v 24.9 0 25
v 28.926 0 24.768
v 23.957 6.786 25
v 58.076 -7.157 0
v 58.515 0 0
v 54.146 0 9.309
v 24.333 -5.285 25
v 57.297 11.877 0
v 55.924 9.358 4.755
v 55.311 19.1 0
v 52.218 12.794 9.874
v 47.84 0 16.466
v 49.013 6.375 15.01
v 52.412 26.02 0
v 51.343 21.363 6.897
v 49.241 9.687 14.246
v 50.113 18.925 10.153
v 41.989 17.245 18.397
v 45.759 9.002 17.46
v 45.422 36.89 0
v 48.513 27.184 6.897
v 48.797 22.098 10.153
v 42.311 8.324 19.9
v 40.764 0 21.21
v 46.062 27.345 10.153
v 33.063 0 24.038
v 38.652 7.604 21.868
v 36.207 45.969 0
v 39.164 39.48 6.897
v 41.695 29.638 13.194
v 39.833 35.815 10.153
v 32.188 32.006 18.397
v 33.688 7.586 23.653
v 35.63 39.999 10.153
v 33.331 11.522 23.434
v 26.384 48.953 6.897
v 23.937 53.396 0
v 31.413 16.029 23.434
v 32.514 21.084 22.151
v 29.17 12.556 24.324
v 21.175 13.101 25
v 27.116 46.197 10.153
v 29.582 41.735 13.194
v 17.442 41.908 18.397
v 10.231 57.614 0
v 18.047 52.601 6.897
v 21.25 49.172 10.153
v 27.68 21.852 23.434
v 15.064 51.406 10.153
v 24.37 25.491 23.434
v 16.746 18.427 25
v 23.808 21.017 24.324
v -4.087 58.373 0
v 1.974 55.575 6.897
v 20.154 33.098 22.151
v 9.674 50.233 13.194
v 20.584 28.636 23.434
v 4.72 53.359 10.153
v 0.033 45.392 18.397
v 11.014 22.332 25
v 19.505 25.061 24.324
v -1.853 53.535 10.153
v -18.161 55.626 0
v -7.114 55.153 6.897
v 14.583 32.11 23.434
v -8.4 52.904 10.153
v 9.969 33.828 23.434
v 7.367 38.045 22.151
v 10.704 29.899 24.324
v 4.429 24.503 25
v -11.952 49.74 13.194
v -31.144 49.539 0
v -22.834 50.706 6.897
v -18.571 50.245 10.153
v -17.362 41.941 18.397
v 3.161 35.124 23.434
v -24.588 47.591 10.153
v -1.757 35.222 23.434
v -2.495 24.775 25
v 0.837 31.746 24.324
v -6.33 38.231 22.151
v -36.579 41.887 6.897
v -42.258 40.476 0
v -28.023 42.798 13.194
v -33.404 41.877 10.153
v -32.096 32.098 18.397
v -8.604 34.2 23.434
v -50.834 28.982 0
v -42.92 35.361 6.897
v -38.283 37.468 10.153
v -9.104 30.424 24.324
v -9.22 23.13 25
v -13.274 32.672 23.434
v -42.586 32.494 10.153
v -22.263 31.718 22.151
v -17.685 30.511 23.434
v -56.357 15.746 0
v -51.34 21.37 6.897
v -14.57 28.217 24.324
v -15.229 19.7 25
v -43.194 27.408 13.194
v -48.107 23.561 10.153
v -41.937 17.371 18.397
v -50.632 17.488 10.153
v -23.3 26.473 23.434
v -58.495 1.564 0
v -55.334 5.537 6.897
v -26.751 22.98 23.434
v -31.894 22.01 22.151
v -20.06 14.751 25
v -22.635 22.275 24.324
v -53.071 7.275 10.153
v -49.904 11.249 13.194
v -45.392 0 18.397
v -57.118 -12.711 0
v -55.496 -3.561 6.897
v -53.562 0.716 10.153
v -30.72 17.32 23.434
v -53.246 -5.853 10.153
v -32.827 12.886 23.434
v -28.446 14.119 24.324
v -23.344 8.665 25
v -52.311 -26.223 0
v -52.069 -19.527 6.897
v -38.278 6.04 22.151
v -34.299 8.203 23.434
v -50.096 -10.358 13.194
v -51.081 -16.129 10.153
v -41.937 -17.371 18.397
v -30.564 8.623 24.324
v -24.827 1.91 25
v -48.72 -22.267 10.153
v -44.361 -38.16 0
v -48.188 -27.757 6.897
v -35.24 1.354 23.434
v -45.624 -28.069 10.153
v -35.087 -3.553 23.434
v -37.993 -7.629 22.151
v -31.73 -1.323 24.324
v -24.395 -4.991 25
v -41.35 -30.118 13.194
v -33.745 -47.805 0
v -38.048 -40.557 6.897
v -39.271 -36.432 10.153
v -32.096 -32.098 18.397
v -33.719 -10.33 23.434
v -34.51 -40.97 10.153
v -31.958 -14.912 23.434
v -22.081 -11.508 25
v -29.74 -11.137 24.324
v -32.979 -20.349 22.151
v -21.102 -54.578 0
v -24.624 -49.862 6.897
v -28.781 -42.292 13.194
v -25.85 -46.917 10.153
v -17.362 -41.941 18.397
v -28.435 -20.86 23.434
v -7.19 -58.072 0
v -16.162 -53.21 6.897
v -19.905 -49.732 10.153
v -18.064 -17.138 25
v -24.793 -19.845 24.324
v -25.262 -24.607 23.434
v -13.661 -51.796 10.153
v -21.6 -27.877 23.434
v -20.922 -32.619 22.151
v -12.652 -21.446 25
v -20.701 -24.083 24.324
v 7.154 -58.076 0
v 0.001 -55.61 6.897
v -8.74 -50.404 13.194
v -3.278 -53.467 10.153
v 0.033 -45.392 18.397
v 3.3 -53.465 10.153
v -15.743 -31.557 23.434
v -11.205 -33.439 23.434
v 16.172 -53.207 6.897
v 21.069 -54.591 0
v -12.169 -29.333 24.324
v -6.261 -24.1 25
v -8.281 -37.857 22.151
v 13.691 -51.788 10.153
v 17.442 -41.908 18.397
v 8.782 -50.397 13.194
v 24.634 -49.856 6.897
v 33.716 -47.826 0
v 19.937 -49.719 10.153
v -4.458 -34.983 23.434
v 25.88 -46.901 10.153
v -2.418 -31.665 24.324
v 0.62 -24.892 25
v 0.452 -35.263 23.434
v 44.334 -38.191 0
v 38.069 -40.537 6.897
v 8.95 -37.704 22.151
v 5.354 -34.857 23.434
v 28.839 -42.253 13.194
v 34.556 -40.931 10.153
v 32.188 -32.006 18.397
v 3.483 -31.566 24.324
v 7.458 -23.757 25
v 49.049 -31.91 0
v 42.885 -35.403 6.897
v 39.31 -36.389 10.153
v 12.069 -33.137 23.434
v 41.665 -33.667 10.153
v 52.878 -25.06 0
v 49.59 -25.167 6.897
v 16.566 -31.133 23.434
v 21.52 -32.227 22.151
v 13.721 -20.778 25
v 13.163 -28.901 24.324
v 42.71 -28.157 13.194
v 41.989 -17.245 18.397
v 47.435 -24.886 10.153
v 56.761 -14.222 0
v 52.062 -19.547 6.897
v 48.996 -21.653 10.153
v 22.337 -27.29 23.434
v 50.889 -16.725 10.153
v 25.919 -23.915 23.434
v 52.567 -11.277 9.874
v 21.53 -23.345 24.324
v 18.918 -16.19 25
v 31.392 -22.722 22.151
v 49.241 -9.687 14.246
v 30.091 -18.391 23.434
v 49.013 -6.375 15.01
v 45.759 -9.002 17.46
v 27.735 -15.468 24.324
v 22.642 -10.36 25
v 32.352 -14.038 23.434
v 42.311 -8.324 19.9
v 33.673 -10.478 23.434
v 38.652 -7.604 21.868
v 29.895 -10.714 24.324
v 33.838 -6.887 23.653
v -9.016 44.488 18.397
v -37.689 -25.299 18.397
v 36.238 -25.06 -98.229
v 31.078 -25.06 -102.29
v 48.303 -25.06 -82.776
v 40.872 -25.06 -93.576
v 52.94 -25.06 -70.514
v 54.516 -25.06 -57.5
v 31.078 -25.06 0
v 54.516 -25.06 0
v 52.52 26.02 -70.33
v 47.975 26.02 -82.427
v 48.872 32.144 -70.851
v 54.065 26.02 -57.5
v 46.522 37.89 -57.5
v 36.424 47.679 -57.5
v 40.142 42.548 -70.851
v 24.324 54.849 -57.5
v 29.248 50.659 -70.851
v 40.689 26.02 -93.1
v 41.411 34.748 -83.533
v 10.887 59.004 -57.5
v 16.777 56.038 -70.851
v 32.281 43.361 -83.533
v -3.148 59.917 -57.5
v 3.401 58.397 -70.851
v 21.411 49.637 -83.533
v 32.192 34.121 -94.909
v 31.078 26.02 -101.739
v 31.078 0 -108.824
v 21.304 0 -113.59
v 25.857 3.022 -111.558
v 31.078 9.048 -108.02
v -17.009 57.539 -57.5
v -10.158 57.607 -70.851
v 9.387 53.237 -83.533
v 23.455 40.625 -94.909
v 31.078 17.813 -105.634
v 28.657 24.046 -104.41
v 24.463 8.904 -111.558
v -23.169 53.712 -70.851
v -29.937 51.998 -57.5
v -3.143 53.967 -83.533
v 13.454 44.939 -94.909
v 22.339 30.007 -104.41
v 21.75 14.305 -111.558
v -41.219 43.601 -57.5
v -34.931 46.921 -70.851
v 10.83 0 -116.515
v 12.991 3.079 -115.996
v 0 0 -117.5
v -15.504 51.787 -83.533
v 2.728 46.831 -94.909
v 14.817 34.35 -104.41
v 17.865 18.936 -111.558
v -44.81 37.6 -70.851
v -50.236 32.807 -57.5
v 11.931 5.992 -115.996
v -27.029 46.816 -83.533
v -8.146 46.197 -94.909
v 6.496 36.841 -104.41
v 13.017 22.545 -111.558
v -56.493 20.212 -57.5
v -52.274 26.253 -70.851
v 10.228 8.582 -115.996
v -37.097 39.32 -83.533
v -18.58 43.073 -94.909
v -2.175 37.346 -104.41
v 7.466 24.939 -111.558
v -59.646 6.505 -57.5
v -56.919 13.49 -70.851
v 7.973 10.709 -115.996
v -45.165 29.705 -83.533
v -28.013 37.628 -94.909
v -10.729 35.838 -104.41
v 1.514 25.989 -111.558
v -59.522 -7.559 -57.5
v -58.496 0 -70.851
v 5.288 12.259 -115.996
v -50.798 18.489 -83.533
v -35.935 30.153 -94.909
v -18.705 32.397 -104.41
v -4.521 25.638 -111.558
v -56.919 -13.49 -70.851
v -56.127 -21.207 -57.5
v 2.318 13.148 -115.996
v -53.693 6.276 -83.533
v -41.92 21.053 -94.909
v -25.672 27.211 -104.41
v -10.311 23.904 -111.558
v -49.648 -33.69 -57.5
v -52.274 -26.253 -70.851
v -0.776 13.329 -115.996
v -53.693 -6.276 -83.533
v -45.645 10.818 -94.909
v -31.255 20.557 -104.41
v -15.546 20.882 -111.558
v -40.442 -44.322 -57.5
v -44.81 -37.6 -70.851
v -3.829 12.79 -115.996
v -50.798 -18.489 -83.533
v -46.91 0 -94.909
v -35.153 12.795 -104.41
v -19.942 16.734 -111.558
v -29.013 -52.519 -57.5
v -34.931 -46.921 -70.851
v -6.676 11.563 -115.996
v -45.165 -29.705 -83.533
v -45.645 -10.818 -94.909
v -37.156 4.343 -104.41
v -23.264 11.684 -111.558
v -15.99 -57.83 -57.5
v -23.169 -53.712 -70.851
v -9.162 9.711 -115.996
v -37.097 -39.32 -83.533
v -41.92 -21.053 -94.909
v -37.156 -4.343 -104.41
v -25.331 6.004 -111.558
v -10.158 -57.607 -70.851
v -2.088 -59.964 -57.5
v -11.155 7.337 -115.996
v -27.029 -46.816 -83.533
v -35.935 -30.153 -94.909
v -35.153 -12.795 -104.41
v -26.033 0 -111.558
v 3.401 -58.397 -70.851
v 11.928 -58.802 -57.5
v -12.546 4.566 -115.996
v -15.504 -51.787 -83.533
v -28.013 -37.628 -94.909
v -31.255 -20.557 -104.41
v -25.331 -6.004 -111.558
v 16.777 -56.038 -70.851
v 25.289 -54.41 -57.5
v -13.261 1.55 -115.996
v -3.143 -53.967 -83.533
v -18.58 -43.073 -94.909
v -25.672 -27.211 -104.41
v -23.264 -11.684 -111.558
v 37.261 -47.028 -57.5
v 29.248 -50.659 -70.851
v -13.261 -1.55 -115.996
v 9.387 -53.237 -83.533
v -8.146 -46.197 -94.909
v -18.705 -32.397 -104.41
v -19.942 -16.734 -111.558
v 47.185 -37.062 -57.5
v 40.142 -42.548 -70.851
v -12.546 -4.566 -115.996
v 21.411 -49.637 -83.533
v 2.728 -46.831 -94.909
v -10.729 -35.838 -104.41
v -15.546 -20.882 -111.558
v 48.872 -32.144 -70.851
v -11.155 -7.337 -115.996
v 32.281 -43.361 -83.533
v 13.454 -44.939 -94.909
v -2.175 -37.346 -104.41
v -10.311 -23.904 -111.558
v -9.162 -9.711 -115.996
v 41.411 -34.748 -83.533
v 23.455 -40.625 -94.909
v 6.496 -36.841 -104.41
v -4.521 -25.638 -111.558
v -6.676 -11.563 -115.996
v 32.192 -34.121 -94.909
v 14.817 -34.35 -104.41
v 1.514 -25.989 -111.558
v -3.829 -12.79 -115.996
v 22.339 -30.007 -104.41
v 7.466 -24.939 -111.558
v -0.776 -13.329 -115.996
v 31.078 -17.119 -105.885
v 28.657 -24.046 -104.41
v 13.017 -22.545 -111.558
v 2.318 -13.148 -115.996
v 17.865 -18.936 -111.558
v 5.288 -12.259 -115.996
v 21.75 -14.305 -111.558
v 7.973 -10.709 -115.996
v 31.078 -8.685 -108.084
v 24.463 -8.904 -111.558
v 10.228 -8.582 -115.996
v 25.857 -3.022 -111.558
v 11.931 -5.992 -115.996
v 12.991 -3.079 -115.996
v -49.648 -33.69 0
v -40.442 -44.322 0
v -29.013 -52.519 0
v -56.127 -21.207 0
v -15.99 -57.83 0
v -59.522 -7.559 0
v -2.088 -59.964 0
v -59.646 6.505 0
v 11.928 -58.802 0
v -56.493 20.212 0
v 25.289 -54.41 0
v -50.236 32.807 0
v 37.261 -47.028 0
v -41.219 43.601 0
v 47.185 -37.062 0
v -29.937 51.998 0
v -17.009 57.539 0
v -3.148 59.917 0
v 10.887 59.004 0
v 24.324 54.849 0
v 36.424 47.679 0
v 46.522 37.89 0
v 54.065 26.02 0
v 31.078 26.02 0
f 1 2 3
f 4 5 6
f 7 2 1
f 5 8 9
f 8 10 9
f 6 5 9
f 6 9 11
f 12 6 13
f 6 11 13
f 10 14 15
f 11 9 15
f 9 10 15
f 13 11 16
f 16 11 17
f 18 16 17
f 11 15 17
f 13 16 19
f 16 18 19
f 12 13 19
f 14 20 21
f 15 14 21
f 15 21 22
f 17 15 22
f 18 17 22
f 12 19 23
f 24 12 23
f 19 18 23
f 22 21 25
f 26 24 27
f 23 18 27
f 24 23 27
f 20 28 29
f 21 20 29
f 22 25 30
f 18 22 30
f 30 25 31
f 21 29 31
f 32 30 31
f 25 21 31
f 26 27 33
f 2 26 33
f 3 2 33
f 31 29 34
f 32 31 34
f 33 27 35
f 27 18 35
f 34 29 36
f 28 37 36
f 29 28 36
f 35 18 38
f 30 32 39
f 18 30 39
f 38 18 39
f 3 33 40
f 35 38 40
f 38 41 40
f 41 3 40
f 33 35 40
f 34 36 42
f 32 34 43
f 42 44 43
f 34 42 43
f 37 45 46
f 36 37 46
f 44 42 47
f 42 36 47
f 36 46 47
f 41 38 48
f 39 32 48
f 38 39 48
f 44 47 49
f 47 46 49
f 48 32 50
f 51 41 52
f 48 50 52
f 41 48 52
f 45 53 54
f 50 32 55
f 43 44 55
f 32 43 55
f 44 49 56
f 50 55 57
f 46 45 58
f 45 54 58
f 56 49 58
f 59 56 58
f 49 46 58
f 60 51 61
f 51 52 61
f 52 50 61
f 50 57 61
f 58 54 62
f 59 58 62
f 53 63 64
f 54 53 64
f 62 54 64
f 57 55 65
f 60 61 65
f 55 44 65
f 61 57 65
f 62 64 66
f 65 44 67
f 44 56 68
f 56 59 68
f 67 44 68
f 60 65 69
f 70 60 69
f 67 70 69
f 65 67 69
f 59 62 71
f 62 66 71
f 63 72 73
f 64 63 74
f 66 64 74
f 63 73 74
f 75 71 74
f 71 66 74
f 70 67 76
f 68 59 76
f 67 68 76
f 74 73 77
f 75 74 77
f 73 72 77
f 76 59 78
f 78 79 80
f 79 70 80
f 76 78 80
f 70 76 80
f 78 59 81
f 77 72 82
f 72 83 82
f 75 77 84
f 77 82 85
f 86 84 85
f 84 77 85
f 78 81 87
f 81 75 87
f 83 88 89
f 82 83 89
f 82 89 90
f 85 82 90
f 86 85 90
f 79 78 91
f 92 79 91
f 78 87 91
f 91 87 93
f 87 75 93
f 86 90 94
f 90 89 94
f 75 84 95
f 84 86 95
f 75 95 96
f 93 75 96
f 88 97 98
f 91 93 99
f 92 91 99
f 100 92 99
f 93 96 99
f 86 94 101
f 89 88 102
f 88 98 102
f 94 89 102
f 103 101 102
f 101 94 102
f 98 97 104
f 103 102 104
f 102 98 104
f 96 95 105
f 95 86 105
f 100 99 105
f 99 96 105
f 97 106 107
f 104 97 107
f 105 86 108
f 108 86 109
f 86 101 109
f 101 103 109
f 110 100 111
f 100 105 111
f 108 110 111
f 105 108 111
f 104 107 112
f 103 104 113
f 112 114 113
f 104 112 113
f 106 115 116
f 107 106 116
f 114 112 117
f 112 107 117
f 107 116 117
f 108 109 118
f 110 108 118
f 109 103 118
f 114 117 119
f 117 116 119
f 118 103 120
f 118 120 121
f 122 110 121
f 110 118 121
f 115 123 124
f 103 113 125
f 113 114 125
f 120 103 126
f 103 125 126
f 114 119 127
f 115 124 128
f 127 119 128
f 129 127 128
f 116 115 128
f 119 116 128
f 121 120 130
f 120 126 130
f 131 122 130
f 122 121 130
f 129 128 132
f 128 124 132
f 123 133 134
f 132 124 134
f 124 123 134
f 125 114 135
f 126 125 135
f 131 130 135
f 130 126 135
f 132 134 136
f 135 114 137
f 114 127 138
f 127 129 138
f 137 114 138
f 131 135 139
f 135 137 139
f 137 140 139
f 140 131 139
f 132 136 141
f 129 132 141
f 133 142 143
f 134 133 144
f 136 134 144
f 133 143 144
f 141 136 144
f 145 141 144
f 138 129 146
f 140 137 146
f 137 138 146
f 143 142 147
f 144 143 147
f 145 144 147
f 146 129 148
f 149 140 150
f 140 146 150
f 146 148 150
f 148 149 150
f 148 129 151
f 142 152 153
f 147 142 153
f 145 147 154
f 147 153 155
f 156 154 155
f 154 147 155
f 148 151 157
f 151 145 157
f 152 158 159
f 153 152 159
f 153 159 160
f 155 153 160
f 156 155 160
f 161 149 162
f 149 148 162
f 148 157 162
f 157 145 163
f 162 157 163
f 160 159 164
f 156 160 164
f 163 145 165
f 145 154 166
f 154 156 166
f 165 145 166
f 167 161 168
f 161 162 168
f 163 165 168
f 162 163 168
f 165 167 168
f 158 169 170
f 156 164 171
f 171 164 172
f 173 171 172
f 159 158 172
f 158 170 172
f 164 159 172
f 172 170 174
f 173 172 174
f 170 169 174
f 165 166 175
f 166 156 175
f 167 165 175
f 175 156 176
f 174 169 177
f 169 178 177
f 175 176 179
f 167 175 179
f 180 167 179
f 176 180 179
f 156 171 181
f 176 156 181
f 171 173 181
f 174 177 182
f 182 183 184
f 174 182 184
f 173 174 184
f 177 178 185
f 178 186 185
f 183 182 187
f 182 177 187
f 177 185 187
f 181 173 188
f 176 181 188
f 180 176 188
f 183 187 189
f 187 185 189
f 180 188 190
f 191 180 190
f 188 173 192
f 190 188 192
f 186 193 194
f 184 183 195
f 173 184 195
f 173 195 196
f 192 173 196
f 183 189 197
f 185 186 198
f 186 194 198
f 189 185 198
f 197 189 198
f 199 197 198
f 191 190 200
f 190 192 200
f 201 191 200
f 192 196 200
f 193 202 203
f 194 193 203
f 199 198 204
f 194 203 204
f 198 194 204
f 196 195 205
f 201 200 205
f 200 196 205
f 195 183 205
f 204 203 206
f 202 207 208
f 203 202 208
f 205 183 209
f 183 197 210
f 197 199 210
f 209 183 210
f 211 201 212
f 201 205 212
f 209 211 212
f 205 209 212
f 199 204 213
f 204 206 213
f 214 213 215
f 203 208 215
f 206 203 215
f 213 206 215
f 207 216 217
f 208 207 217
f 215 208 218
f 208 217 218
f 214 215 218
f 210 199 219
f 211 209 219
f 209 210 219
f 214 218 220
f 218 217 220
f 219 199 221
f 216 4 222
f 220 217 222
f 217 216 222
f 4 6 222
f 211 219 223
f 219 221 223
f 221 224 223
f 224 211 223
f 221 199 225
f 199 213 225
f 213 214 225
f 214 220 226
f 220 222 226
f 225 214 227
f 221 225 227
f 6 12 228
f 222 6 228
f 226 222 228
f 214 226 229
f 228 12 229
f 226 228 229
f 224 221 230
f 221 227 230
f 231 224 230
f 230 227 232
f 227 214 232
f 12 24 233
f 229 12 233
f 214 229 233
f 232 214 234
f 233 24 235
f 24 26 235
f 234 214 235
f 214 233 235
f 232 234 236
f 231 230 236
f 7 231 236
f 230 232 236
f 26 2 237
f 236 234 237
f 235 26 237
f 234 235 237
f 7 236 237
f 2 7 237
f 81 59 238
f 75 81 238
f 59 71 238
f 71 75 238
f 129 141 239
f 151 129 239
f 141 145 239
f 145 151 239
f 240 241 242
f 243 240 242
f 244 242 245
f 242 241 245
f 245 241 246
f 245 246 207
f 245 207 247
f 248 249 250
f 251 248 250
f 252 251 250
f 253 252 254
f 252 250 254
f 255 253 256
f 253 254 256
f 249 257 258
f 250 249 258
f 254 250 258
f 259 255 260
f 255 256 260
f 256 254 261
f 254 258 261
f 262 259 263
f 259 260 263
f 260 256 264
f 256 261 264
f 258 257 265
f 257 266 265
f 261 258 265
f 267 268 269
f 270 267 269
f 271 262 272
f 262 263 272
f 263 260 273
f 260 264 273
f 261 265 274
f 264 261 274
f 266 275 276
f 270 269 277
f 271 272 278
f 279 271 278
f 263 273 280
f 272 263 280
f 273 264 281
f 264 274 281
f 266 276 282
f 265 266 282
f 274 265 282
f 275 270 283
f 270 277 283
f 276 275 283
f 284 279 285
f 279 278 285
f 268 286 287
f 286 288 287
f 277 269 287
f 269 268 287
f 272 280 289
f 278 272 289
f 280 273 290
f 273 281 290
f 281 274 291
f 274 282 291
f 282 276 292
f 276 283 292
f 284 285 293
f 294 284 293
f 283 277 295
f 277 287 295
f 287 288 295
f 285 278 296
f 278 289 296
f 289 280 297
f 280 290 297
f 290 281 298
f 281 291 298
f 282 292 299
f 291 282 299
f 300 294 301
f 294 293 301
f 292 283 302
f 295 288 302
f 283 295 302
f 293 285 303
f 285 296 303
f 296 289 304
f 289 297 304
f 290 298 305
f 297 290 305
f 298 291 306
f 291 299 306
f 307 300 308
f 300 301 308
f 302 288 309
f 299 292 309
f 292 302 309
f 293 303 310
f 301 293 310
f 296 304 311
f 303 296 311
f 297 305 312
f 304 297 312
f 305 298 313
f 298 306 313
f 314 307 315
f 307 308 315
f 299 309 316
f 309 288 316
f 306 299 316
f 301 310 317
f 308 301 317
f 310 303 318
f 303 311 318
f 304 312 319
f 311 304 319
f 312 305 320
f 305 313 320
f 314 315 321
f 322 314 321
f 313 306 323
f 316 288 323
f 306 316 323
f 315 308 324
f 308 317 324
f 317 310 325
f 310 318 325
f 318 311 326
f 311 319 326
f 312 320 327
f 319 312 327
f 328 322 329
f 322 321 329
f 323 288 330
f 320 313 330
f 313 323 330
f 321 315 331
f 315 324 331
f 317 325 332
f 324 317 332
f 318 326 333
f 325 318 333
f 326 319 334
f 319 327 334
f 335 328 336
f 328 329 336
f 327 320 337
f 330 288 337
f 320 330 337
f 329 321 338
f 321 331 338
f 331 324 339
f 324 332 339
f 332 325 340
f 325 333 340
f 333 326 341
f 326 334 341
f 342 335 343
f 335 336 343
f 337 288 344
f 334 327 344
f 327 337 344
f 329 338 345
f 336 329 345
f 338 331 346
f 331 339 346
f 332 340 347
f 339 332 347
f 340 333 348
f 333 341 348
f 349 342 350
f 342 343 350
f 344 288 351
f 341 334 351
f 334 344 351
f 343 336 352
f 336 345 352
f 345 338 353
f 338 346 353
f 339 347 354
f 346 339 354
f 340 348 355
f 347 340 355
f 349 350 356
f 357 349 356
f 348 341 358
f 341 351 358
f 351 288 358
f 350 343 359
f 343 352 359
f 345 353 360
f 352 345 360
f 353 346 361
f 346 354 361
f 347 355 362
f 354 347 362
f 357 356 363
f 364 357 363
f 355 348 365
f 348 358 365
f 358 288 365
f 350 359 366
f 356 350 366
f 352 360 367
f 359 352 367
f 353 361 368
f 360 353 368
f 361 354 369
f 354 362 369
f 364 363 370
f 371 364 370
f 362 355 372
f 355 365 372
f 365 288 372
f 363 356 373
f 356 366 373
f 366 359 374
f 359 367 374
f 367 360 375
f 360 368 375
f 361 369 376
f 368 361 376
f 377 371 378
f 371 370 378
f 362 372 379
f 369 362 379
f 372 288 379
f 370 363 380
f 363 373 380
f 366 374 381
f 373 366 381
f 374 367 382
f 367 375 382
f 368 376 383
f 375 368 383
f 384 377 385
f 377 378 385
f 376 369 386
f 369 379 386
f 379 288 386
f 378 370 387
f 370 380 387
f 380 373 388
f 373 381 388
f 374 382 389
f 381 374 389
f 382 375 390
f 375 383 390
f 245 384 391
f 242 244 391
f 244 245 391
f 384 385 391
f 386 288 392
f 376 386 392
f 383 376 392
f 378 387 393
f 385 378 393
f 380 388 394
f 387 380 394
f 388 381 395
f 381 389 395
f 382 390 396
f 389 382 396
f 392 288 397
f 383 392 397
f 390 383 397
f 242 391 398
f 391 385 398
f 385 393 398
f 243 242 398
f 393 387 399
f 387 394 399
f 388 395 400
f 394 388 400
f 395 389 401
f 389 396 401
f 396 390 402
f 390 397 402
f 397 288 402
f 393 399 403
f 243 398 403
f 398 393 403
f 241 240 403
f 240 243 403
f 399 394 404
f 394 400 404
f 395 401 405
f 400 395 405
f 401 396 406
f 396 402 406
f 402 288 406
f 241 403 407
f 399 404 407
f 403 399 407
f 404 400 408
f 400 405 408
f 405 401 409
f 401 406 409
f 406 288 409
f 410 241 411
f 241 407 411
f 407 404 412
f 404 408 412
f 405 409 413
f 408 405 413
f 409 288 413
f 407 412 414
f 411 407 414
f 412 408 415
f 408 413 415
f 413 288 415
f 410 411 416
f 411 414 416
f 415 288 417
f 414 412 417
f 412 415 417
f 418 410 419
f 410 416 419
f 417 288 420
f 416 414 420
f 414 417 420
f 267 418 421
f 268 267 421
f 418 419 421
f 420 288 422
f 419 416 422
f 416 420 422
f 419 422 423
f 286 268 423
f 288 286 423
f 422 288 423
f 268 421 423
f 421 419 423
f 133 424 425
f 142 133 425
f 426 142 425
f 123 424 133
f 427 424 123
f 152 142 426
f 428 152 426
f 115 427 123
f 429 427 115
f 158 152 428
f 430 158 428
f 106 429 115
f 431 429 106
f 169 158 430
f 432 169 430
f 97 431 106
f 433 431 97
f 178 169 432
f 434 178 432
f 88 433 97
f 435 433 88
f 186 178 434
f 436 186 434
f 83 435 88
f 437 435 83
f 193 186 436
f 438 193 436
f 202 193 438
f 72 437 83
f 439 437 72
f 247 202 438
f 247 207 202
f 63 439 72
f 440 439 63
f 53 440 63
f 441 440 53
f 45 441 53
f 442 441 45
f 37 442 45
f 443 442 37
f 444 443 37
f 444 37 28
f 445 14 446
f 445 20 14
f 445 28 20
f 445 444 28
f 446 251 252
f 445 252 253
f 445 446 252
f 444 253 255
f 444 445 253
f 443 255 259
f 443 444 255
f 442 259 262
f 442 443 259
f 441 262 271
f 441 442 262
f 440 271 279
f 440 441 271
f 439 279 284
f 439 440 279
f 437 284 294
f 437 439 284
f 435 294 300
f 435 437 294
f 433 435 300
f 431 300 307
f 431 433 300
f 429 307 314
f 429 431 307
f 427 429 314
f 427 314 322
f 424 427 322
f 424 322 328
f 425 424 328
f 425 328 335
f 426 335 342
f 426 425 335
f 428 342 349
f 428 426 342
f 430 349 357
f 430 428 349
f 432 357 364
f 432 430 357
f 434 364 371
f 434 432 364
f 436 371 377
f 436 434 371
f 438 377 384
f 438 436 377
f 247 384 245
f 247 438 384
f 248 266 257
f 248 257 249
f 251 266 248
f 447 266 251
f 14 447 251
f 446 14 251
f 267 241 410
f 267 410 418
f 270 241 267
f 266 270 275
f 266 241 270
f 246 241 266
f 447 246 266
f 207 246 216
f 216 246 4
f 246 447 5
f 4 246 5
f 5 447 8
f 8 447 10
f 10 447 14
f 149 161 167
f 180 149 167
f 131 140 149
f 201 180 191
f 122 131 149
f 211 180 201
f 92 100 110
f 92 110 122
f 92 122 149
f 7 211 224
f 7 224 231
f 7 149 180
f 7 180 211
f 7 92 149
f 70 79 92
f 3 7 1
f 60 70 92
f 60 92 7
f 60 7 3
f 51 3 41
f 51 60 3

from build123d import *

# Parameters (mm, degrees)
F0_R     = 60
F0_R_2   = 58.5
F1_DEPTH = 70
F2_R     = 60
F3_DEPTH = 25
F4_R     = 35.1
F5_R     = 60
F6_DEPTH = 117.5
F7_R     = 60
F8_W     = 33.7252318859
F8_H     = 51.0791689157
F9_DEPTH = 133


with BuildPart() as f1:
    # F0 (on Top) → F1 (new body)
    with BuildSketch(Plane.XY):
        Circle(F0_R)
        Circle(F0_R_2, mode=Mode.SUBTRACT)
    extrude(amount=-F1_DEPTH)

    # F2 (on Top) → F3 (join)
    with BuildSketch(Plane.XY):
        Circle(F2_R)
    extrude(amount=F3_DEPTH)

    # F4
    f4_edges = [f1.edges().sort_by_distance(p)[0] for p in [
        (-60, 0, 25),
    ]]
    fillet(f4_edges, radius=F4_R)

    # F5 (on Top) → F6 (join)
    with BuildSketch(Plane.XY):
        Circle(F5_R)
    extrude(amount=-F6_DEPTH)

    # F7
    f7_edges = [f1.edges().sort_by_distance(p)[0] for p in [
        (-60, 0, -117.5),
        (-24.9, 0, 25),
    ]]
    fillet(f7_edges, radius=F7_R)

    # F8 (on Top) → F9 (cut)
    with BuildSketch(Plane.XY):
        with Locations((47.9409359396, 0.4799189046)):
            Rectangle(F8_W, F8_H)
    extrude(amount=-F9_DEPTH, mode=Mode.SUBTRACT)


solid = f1.part
